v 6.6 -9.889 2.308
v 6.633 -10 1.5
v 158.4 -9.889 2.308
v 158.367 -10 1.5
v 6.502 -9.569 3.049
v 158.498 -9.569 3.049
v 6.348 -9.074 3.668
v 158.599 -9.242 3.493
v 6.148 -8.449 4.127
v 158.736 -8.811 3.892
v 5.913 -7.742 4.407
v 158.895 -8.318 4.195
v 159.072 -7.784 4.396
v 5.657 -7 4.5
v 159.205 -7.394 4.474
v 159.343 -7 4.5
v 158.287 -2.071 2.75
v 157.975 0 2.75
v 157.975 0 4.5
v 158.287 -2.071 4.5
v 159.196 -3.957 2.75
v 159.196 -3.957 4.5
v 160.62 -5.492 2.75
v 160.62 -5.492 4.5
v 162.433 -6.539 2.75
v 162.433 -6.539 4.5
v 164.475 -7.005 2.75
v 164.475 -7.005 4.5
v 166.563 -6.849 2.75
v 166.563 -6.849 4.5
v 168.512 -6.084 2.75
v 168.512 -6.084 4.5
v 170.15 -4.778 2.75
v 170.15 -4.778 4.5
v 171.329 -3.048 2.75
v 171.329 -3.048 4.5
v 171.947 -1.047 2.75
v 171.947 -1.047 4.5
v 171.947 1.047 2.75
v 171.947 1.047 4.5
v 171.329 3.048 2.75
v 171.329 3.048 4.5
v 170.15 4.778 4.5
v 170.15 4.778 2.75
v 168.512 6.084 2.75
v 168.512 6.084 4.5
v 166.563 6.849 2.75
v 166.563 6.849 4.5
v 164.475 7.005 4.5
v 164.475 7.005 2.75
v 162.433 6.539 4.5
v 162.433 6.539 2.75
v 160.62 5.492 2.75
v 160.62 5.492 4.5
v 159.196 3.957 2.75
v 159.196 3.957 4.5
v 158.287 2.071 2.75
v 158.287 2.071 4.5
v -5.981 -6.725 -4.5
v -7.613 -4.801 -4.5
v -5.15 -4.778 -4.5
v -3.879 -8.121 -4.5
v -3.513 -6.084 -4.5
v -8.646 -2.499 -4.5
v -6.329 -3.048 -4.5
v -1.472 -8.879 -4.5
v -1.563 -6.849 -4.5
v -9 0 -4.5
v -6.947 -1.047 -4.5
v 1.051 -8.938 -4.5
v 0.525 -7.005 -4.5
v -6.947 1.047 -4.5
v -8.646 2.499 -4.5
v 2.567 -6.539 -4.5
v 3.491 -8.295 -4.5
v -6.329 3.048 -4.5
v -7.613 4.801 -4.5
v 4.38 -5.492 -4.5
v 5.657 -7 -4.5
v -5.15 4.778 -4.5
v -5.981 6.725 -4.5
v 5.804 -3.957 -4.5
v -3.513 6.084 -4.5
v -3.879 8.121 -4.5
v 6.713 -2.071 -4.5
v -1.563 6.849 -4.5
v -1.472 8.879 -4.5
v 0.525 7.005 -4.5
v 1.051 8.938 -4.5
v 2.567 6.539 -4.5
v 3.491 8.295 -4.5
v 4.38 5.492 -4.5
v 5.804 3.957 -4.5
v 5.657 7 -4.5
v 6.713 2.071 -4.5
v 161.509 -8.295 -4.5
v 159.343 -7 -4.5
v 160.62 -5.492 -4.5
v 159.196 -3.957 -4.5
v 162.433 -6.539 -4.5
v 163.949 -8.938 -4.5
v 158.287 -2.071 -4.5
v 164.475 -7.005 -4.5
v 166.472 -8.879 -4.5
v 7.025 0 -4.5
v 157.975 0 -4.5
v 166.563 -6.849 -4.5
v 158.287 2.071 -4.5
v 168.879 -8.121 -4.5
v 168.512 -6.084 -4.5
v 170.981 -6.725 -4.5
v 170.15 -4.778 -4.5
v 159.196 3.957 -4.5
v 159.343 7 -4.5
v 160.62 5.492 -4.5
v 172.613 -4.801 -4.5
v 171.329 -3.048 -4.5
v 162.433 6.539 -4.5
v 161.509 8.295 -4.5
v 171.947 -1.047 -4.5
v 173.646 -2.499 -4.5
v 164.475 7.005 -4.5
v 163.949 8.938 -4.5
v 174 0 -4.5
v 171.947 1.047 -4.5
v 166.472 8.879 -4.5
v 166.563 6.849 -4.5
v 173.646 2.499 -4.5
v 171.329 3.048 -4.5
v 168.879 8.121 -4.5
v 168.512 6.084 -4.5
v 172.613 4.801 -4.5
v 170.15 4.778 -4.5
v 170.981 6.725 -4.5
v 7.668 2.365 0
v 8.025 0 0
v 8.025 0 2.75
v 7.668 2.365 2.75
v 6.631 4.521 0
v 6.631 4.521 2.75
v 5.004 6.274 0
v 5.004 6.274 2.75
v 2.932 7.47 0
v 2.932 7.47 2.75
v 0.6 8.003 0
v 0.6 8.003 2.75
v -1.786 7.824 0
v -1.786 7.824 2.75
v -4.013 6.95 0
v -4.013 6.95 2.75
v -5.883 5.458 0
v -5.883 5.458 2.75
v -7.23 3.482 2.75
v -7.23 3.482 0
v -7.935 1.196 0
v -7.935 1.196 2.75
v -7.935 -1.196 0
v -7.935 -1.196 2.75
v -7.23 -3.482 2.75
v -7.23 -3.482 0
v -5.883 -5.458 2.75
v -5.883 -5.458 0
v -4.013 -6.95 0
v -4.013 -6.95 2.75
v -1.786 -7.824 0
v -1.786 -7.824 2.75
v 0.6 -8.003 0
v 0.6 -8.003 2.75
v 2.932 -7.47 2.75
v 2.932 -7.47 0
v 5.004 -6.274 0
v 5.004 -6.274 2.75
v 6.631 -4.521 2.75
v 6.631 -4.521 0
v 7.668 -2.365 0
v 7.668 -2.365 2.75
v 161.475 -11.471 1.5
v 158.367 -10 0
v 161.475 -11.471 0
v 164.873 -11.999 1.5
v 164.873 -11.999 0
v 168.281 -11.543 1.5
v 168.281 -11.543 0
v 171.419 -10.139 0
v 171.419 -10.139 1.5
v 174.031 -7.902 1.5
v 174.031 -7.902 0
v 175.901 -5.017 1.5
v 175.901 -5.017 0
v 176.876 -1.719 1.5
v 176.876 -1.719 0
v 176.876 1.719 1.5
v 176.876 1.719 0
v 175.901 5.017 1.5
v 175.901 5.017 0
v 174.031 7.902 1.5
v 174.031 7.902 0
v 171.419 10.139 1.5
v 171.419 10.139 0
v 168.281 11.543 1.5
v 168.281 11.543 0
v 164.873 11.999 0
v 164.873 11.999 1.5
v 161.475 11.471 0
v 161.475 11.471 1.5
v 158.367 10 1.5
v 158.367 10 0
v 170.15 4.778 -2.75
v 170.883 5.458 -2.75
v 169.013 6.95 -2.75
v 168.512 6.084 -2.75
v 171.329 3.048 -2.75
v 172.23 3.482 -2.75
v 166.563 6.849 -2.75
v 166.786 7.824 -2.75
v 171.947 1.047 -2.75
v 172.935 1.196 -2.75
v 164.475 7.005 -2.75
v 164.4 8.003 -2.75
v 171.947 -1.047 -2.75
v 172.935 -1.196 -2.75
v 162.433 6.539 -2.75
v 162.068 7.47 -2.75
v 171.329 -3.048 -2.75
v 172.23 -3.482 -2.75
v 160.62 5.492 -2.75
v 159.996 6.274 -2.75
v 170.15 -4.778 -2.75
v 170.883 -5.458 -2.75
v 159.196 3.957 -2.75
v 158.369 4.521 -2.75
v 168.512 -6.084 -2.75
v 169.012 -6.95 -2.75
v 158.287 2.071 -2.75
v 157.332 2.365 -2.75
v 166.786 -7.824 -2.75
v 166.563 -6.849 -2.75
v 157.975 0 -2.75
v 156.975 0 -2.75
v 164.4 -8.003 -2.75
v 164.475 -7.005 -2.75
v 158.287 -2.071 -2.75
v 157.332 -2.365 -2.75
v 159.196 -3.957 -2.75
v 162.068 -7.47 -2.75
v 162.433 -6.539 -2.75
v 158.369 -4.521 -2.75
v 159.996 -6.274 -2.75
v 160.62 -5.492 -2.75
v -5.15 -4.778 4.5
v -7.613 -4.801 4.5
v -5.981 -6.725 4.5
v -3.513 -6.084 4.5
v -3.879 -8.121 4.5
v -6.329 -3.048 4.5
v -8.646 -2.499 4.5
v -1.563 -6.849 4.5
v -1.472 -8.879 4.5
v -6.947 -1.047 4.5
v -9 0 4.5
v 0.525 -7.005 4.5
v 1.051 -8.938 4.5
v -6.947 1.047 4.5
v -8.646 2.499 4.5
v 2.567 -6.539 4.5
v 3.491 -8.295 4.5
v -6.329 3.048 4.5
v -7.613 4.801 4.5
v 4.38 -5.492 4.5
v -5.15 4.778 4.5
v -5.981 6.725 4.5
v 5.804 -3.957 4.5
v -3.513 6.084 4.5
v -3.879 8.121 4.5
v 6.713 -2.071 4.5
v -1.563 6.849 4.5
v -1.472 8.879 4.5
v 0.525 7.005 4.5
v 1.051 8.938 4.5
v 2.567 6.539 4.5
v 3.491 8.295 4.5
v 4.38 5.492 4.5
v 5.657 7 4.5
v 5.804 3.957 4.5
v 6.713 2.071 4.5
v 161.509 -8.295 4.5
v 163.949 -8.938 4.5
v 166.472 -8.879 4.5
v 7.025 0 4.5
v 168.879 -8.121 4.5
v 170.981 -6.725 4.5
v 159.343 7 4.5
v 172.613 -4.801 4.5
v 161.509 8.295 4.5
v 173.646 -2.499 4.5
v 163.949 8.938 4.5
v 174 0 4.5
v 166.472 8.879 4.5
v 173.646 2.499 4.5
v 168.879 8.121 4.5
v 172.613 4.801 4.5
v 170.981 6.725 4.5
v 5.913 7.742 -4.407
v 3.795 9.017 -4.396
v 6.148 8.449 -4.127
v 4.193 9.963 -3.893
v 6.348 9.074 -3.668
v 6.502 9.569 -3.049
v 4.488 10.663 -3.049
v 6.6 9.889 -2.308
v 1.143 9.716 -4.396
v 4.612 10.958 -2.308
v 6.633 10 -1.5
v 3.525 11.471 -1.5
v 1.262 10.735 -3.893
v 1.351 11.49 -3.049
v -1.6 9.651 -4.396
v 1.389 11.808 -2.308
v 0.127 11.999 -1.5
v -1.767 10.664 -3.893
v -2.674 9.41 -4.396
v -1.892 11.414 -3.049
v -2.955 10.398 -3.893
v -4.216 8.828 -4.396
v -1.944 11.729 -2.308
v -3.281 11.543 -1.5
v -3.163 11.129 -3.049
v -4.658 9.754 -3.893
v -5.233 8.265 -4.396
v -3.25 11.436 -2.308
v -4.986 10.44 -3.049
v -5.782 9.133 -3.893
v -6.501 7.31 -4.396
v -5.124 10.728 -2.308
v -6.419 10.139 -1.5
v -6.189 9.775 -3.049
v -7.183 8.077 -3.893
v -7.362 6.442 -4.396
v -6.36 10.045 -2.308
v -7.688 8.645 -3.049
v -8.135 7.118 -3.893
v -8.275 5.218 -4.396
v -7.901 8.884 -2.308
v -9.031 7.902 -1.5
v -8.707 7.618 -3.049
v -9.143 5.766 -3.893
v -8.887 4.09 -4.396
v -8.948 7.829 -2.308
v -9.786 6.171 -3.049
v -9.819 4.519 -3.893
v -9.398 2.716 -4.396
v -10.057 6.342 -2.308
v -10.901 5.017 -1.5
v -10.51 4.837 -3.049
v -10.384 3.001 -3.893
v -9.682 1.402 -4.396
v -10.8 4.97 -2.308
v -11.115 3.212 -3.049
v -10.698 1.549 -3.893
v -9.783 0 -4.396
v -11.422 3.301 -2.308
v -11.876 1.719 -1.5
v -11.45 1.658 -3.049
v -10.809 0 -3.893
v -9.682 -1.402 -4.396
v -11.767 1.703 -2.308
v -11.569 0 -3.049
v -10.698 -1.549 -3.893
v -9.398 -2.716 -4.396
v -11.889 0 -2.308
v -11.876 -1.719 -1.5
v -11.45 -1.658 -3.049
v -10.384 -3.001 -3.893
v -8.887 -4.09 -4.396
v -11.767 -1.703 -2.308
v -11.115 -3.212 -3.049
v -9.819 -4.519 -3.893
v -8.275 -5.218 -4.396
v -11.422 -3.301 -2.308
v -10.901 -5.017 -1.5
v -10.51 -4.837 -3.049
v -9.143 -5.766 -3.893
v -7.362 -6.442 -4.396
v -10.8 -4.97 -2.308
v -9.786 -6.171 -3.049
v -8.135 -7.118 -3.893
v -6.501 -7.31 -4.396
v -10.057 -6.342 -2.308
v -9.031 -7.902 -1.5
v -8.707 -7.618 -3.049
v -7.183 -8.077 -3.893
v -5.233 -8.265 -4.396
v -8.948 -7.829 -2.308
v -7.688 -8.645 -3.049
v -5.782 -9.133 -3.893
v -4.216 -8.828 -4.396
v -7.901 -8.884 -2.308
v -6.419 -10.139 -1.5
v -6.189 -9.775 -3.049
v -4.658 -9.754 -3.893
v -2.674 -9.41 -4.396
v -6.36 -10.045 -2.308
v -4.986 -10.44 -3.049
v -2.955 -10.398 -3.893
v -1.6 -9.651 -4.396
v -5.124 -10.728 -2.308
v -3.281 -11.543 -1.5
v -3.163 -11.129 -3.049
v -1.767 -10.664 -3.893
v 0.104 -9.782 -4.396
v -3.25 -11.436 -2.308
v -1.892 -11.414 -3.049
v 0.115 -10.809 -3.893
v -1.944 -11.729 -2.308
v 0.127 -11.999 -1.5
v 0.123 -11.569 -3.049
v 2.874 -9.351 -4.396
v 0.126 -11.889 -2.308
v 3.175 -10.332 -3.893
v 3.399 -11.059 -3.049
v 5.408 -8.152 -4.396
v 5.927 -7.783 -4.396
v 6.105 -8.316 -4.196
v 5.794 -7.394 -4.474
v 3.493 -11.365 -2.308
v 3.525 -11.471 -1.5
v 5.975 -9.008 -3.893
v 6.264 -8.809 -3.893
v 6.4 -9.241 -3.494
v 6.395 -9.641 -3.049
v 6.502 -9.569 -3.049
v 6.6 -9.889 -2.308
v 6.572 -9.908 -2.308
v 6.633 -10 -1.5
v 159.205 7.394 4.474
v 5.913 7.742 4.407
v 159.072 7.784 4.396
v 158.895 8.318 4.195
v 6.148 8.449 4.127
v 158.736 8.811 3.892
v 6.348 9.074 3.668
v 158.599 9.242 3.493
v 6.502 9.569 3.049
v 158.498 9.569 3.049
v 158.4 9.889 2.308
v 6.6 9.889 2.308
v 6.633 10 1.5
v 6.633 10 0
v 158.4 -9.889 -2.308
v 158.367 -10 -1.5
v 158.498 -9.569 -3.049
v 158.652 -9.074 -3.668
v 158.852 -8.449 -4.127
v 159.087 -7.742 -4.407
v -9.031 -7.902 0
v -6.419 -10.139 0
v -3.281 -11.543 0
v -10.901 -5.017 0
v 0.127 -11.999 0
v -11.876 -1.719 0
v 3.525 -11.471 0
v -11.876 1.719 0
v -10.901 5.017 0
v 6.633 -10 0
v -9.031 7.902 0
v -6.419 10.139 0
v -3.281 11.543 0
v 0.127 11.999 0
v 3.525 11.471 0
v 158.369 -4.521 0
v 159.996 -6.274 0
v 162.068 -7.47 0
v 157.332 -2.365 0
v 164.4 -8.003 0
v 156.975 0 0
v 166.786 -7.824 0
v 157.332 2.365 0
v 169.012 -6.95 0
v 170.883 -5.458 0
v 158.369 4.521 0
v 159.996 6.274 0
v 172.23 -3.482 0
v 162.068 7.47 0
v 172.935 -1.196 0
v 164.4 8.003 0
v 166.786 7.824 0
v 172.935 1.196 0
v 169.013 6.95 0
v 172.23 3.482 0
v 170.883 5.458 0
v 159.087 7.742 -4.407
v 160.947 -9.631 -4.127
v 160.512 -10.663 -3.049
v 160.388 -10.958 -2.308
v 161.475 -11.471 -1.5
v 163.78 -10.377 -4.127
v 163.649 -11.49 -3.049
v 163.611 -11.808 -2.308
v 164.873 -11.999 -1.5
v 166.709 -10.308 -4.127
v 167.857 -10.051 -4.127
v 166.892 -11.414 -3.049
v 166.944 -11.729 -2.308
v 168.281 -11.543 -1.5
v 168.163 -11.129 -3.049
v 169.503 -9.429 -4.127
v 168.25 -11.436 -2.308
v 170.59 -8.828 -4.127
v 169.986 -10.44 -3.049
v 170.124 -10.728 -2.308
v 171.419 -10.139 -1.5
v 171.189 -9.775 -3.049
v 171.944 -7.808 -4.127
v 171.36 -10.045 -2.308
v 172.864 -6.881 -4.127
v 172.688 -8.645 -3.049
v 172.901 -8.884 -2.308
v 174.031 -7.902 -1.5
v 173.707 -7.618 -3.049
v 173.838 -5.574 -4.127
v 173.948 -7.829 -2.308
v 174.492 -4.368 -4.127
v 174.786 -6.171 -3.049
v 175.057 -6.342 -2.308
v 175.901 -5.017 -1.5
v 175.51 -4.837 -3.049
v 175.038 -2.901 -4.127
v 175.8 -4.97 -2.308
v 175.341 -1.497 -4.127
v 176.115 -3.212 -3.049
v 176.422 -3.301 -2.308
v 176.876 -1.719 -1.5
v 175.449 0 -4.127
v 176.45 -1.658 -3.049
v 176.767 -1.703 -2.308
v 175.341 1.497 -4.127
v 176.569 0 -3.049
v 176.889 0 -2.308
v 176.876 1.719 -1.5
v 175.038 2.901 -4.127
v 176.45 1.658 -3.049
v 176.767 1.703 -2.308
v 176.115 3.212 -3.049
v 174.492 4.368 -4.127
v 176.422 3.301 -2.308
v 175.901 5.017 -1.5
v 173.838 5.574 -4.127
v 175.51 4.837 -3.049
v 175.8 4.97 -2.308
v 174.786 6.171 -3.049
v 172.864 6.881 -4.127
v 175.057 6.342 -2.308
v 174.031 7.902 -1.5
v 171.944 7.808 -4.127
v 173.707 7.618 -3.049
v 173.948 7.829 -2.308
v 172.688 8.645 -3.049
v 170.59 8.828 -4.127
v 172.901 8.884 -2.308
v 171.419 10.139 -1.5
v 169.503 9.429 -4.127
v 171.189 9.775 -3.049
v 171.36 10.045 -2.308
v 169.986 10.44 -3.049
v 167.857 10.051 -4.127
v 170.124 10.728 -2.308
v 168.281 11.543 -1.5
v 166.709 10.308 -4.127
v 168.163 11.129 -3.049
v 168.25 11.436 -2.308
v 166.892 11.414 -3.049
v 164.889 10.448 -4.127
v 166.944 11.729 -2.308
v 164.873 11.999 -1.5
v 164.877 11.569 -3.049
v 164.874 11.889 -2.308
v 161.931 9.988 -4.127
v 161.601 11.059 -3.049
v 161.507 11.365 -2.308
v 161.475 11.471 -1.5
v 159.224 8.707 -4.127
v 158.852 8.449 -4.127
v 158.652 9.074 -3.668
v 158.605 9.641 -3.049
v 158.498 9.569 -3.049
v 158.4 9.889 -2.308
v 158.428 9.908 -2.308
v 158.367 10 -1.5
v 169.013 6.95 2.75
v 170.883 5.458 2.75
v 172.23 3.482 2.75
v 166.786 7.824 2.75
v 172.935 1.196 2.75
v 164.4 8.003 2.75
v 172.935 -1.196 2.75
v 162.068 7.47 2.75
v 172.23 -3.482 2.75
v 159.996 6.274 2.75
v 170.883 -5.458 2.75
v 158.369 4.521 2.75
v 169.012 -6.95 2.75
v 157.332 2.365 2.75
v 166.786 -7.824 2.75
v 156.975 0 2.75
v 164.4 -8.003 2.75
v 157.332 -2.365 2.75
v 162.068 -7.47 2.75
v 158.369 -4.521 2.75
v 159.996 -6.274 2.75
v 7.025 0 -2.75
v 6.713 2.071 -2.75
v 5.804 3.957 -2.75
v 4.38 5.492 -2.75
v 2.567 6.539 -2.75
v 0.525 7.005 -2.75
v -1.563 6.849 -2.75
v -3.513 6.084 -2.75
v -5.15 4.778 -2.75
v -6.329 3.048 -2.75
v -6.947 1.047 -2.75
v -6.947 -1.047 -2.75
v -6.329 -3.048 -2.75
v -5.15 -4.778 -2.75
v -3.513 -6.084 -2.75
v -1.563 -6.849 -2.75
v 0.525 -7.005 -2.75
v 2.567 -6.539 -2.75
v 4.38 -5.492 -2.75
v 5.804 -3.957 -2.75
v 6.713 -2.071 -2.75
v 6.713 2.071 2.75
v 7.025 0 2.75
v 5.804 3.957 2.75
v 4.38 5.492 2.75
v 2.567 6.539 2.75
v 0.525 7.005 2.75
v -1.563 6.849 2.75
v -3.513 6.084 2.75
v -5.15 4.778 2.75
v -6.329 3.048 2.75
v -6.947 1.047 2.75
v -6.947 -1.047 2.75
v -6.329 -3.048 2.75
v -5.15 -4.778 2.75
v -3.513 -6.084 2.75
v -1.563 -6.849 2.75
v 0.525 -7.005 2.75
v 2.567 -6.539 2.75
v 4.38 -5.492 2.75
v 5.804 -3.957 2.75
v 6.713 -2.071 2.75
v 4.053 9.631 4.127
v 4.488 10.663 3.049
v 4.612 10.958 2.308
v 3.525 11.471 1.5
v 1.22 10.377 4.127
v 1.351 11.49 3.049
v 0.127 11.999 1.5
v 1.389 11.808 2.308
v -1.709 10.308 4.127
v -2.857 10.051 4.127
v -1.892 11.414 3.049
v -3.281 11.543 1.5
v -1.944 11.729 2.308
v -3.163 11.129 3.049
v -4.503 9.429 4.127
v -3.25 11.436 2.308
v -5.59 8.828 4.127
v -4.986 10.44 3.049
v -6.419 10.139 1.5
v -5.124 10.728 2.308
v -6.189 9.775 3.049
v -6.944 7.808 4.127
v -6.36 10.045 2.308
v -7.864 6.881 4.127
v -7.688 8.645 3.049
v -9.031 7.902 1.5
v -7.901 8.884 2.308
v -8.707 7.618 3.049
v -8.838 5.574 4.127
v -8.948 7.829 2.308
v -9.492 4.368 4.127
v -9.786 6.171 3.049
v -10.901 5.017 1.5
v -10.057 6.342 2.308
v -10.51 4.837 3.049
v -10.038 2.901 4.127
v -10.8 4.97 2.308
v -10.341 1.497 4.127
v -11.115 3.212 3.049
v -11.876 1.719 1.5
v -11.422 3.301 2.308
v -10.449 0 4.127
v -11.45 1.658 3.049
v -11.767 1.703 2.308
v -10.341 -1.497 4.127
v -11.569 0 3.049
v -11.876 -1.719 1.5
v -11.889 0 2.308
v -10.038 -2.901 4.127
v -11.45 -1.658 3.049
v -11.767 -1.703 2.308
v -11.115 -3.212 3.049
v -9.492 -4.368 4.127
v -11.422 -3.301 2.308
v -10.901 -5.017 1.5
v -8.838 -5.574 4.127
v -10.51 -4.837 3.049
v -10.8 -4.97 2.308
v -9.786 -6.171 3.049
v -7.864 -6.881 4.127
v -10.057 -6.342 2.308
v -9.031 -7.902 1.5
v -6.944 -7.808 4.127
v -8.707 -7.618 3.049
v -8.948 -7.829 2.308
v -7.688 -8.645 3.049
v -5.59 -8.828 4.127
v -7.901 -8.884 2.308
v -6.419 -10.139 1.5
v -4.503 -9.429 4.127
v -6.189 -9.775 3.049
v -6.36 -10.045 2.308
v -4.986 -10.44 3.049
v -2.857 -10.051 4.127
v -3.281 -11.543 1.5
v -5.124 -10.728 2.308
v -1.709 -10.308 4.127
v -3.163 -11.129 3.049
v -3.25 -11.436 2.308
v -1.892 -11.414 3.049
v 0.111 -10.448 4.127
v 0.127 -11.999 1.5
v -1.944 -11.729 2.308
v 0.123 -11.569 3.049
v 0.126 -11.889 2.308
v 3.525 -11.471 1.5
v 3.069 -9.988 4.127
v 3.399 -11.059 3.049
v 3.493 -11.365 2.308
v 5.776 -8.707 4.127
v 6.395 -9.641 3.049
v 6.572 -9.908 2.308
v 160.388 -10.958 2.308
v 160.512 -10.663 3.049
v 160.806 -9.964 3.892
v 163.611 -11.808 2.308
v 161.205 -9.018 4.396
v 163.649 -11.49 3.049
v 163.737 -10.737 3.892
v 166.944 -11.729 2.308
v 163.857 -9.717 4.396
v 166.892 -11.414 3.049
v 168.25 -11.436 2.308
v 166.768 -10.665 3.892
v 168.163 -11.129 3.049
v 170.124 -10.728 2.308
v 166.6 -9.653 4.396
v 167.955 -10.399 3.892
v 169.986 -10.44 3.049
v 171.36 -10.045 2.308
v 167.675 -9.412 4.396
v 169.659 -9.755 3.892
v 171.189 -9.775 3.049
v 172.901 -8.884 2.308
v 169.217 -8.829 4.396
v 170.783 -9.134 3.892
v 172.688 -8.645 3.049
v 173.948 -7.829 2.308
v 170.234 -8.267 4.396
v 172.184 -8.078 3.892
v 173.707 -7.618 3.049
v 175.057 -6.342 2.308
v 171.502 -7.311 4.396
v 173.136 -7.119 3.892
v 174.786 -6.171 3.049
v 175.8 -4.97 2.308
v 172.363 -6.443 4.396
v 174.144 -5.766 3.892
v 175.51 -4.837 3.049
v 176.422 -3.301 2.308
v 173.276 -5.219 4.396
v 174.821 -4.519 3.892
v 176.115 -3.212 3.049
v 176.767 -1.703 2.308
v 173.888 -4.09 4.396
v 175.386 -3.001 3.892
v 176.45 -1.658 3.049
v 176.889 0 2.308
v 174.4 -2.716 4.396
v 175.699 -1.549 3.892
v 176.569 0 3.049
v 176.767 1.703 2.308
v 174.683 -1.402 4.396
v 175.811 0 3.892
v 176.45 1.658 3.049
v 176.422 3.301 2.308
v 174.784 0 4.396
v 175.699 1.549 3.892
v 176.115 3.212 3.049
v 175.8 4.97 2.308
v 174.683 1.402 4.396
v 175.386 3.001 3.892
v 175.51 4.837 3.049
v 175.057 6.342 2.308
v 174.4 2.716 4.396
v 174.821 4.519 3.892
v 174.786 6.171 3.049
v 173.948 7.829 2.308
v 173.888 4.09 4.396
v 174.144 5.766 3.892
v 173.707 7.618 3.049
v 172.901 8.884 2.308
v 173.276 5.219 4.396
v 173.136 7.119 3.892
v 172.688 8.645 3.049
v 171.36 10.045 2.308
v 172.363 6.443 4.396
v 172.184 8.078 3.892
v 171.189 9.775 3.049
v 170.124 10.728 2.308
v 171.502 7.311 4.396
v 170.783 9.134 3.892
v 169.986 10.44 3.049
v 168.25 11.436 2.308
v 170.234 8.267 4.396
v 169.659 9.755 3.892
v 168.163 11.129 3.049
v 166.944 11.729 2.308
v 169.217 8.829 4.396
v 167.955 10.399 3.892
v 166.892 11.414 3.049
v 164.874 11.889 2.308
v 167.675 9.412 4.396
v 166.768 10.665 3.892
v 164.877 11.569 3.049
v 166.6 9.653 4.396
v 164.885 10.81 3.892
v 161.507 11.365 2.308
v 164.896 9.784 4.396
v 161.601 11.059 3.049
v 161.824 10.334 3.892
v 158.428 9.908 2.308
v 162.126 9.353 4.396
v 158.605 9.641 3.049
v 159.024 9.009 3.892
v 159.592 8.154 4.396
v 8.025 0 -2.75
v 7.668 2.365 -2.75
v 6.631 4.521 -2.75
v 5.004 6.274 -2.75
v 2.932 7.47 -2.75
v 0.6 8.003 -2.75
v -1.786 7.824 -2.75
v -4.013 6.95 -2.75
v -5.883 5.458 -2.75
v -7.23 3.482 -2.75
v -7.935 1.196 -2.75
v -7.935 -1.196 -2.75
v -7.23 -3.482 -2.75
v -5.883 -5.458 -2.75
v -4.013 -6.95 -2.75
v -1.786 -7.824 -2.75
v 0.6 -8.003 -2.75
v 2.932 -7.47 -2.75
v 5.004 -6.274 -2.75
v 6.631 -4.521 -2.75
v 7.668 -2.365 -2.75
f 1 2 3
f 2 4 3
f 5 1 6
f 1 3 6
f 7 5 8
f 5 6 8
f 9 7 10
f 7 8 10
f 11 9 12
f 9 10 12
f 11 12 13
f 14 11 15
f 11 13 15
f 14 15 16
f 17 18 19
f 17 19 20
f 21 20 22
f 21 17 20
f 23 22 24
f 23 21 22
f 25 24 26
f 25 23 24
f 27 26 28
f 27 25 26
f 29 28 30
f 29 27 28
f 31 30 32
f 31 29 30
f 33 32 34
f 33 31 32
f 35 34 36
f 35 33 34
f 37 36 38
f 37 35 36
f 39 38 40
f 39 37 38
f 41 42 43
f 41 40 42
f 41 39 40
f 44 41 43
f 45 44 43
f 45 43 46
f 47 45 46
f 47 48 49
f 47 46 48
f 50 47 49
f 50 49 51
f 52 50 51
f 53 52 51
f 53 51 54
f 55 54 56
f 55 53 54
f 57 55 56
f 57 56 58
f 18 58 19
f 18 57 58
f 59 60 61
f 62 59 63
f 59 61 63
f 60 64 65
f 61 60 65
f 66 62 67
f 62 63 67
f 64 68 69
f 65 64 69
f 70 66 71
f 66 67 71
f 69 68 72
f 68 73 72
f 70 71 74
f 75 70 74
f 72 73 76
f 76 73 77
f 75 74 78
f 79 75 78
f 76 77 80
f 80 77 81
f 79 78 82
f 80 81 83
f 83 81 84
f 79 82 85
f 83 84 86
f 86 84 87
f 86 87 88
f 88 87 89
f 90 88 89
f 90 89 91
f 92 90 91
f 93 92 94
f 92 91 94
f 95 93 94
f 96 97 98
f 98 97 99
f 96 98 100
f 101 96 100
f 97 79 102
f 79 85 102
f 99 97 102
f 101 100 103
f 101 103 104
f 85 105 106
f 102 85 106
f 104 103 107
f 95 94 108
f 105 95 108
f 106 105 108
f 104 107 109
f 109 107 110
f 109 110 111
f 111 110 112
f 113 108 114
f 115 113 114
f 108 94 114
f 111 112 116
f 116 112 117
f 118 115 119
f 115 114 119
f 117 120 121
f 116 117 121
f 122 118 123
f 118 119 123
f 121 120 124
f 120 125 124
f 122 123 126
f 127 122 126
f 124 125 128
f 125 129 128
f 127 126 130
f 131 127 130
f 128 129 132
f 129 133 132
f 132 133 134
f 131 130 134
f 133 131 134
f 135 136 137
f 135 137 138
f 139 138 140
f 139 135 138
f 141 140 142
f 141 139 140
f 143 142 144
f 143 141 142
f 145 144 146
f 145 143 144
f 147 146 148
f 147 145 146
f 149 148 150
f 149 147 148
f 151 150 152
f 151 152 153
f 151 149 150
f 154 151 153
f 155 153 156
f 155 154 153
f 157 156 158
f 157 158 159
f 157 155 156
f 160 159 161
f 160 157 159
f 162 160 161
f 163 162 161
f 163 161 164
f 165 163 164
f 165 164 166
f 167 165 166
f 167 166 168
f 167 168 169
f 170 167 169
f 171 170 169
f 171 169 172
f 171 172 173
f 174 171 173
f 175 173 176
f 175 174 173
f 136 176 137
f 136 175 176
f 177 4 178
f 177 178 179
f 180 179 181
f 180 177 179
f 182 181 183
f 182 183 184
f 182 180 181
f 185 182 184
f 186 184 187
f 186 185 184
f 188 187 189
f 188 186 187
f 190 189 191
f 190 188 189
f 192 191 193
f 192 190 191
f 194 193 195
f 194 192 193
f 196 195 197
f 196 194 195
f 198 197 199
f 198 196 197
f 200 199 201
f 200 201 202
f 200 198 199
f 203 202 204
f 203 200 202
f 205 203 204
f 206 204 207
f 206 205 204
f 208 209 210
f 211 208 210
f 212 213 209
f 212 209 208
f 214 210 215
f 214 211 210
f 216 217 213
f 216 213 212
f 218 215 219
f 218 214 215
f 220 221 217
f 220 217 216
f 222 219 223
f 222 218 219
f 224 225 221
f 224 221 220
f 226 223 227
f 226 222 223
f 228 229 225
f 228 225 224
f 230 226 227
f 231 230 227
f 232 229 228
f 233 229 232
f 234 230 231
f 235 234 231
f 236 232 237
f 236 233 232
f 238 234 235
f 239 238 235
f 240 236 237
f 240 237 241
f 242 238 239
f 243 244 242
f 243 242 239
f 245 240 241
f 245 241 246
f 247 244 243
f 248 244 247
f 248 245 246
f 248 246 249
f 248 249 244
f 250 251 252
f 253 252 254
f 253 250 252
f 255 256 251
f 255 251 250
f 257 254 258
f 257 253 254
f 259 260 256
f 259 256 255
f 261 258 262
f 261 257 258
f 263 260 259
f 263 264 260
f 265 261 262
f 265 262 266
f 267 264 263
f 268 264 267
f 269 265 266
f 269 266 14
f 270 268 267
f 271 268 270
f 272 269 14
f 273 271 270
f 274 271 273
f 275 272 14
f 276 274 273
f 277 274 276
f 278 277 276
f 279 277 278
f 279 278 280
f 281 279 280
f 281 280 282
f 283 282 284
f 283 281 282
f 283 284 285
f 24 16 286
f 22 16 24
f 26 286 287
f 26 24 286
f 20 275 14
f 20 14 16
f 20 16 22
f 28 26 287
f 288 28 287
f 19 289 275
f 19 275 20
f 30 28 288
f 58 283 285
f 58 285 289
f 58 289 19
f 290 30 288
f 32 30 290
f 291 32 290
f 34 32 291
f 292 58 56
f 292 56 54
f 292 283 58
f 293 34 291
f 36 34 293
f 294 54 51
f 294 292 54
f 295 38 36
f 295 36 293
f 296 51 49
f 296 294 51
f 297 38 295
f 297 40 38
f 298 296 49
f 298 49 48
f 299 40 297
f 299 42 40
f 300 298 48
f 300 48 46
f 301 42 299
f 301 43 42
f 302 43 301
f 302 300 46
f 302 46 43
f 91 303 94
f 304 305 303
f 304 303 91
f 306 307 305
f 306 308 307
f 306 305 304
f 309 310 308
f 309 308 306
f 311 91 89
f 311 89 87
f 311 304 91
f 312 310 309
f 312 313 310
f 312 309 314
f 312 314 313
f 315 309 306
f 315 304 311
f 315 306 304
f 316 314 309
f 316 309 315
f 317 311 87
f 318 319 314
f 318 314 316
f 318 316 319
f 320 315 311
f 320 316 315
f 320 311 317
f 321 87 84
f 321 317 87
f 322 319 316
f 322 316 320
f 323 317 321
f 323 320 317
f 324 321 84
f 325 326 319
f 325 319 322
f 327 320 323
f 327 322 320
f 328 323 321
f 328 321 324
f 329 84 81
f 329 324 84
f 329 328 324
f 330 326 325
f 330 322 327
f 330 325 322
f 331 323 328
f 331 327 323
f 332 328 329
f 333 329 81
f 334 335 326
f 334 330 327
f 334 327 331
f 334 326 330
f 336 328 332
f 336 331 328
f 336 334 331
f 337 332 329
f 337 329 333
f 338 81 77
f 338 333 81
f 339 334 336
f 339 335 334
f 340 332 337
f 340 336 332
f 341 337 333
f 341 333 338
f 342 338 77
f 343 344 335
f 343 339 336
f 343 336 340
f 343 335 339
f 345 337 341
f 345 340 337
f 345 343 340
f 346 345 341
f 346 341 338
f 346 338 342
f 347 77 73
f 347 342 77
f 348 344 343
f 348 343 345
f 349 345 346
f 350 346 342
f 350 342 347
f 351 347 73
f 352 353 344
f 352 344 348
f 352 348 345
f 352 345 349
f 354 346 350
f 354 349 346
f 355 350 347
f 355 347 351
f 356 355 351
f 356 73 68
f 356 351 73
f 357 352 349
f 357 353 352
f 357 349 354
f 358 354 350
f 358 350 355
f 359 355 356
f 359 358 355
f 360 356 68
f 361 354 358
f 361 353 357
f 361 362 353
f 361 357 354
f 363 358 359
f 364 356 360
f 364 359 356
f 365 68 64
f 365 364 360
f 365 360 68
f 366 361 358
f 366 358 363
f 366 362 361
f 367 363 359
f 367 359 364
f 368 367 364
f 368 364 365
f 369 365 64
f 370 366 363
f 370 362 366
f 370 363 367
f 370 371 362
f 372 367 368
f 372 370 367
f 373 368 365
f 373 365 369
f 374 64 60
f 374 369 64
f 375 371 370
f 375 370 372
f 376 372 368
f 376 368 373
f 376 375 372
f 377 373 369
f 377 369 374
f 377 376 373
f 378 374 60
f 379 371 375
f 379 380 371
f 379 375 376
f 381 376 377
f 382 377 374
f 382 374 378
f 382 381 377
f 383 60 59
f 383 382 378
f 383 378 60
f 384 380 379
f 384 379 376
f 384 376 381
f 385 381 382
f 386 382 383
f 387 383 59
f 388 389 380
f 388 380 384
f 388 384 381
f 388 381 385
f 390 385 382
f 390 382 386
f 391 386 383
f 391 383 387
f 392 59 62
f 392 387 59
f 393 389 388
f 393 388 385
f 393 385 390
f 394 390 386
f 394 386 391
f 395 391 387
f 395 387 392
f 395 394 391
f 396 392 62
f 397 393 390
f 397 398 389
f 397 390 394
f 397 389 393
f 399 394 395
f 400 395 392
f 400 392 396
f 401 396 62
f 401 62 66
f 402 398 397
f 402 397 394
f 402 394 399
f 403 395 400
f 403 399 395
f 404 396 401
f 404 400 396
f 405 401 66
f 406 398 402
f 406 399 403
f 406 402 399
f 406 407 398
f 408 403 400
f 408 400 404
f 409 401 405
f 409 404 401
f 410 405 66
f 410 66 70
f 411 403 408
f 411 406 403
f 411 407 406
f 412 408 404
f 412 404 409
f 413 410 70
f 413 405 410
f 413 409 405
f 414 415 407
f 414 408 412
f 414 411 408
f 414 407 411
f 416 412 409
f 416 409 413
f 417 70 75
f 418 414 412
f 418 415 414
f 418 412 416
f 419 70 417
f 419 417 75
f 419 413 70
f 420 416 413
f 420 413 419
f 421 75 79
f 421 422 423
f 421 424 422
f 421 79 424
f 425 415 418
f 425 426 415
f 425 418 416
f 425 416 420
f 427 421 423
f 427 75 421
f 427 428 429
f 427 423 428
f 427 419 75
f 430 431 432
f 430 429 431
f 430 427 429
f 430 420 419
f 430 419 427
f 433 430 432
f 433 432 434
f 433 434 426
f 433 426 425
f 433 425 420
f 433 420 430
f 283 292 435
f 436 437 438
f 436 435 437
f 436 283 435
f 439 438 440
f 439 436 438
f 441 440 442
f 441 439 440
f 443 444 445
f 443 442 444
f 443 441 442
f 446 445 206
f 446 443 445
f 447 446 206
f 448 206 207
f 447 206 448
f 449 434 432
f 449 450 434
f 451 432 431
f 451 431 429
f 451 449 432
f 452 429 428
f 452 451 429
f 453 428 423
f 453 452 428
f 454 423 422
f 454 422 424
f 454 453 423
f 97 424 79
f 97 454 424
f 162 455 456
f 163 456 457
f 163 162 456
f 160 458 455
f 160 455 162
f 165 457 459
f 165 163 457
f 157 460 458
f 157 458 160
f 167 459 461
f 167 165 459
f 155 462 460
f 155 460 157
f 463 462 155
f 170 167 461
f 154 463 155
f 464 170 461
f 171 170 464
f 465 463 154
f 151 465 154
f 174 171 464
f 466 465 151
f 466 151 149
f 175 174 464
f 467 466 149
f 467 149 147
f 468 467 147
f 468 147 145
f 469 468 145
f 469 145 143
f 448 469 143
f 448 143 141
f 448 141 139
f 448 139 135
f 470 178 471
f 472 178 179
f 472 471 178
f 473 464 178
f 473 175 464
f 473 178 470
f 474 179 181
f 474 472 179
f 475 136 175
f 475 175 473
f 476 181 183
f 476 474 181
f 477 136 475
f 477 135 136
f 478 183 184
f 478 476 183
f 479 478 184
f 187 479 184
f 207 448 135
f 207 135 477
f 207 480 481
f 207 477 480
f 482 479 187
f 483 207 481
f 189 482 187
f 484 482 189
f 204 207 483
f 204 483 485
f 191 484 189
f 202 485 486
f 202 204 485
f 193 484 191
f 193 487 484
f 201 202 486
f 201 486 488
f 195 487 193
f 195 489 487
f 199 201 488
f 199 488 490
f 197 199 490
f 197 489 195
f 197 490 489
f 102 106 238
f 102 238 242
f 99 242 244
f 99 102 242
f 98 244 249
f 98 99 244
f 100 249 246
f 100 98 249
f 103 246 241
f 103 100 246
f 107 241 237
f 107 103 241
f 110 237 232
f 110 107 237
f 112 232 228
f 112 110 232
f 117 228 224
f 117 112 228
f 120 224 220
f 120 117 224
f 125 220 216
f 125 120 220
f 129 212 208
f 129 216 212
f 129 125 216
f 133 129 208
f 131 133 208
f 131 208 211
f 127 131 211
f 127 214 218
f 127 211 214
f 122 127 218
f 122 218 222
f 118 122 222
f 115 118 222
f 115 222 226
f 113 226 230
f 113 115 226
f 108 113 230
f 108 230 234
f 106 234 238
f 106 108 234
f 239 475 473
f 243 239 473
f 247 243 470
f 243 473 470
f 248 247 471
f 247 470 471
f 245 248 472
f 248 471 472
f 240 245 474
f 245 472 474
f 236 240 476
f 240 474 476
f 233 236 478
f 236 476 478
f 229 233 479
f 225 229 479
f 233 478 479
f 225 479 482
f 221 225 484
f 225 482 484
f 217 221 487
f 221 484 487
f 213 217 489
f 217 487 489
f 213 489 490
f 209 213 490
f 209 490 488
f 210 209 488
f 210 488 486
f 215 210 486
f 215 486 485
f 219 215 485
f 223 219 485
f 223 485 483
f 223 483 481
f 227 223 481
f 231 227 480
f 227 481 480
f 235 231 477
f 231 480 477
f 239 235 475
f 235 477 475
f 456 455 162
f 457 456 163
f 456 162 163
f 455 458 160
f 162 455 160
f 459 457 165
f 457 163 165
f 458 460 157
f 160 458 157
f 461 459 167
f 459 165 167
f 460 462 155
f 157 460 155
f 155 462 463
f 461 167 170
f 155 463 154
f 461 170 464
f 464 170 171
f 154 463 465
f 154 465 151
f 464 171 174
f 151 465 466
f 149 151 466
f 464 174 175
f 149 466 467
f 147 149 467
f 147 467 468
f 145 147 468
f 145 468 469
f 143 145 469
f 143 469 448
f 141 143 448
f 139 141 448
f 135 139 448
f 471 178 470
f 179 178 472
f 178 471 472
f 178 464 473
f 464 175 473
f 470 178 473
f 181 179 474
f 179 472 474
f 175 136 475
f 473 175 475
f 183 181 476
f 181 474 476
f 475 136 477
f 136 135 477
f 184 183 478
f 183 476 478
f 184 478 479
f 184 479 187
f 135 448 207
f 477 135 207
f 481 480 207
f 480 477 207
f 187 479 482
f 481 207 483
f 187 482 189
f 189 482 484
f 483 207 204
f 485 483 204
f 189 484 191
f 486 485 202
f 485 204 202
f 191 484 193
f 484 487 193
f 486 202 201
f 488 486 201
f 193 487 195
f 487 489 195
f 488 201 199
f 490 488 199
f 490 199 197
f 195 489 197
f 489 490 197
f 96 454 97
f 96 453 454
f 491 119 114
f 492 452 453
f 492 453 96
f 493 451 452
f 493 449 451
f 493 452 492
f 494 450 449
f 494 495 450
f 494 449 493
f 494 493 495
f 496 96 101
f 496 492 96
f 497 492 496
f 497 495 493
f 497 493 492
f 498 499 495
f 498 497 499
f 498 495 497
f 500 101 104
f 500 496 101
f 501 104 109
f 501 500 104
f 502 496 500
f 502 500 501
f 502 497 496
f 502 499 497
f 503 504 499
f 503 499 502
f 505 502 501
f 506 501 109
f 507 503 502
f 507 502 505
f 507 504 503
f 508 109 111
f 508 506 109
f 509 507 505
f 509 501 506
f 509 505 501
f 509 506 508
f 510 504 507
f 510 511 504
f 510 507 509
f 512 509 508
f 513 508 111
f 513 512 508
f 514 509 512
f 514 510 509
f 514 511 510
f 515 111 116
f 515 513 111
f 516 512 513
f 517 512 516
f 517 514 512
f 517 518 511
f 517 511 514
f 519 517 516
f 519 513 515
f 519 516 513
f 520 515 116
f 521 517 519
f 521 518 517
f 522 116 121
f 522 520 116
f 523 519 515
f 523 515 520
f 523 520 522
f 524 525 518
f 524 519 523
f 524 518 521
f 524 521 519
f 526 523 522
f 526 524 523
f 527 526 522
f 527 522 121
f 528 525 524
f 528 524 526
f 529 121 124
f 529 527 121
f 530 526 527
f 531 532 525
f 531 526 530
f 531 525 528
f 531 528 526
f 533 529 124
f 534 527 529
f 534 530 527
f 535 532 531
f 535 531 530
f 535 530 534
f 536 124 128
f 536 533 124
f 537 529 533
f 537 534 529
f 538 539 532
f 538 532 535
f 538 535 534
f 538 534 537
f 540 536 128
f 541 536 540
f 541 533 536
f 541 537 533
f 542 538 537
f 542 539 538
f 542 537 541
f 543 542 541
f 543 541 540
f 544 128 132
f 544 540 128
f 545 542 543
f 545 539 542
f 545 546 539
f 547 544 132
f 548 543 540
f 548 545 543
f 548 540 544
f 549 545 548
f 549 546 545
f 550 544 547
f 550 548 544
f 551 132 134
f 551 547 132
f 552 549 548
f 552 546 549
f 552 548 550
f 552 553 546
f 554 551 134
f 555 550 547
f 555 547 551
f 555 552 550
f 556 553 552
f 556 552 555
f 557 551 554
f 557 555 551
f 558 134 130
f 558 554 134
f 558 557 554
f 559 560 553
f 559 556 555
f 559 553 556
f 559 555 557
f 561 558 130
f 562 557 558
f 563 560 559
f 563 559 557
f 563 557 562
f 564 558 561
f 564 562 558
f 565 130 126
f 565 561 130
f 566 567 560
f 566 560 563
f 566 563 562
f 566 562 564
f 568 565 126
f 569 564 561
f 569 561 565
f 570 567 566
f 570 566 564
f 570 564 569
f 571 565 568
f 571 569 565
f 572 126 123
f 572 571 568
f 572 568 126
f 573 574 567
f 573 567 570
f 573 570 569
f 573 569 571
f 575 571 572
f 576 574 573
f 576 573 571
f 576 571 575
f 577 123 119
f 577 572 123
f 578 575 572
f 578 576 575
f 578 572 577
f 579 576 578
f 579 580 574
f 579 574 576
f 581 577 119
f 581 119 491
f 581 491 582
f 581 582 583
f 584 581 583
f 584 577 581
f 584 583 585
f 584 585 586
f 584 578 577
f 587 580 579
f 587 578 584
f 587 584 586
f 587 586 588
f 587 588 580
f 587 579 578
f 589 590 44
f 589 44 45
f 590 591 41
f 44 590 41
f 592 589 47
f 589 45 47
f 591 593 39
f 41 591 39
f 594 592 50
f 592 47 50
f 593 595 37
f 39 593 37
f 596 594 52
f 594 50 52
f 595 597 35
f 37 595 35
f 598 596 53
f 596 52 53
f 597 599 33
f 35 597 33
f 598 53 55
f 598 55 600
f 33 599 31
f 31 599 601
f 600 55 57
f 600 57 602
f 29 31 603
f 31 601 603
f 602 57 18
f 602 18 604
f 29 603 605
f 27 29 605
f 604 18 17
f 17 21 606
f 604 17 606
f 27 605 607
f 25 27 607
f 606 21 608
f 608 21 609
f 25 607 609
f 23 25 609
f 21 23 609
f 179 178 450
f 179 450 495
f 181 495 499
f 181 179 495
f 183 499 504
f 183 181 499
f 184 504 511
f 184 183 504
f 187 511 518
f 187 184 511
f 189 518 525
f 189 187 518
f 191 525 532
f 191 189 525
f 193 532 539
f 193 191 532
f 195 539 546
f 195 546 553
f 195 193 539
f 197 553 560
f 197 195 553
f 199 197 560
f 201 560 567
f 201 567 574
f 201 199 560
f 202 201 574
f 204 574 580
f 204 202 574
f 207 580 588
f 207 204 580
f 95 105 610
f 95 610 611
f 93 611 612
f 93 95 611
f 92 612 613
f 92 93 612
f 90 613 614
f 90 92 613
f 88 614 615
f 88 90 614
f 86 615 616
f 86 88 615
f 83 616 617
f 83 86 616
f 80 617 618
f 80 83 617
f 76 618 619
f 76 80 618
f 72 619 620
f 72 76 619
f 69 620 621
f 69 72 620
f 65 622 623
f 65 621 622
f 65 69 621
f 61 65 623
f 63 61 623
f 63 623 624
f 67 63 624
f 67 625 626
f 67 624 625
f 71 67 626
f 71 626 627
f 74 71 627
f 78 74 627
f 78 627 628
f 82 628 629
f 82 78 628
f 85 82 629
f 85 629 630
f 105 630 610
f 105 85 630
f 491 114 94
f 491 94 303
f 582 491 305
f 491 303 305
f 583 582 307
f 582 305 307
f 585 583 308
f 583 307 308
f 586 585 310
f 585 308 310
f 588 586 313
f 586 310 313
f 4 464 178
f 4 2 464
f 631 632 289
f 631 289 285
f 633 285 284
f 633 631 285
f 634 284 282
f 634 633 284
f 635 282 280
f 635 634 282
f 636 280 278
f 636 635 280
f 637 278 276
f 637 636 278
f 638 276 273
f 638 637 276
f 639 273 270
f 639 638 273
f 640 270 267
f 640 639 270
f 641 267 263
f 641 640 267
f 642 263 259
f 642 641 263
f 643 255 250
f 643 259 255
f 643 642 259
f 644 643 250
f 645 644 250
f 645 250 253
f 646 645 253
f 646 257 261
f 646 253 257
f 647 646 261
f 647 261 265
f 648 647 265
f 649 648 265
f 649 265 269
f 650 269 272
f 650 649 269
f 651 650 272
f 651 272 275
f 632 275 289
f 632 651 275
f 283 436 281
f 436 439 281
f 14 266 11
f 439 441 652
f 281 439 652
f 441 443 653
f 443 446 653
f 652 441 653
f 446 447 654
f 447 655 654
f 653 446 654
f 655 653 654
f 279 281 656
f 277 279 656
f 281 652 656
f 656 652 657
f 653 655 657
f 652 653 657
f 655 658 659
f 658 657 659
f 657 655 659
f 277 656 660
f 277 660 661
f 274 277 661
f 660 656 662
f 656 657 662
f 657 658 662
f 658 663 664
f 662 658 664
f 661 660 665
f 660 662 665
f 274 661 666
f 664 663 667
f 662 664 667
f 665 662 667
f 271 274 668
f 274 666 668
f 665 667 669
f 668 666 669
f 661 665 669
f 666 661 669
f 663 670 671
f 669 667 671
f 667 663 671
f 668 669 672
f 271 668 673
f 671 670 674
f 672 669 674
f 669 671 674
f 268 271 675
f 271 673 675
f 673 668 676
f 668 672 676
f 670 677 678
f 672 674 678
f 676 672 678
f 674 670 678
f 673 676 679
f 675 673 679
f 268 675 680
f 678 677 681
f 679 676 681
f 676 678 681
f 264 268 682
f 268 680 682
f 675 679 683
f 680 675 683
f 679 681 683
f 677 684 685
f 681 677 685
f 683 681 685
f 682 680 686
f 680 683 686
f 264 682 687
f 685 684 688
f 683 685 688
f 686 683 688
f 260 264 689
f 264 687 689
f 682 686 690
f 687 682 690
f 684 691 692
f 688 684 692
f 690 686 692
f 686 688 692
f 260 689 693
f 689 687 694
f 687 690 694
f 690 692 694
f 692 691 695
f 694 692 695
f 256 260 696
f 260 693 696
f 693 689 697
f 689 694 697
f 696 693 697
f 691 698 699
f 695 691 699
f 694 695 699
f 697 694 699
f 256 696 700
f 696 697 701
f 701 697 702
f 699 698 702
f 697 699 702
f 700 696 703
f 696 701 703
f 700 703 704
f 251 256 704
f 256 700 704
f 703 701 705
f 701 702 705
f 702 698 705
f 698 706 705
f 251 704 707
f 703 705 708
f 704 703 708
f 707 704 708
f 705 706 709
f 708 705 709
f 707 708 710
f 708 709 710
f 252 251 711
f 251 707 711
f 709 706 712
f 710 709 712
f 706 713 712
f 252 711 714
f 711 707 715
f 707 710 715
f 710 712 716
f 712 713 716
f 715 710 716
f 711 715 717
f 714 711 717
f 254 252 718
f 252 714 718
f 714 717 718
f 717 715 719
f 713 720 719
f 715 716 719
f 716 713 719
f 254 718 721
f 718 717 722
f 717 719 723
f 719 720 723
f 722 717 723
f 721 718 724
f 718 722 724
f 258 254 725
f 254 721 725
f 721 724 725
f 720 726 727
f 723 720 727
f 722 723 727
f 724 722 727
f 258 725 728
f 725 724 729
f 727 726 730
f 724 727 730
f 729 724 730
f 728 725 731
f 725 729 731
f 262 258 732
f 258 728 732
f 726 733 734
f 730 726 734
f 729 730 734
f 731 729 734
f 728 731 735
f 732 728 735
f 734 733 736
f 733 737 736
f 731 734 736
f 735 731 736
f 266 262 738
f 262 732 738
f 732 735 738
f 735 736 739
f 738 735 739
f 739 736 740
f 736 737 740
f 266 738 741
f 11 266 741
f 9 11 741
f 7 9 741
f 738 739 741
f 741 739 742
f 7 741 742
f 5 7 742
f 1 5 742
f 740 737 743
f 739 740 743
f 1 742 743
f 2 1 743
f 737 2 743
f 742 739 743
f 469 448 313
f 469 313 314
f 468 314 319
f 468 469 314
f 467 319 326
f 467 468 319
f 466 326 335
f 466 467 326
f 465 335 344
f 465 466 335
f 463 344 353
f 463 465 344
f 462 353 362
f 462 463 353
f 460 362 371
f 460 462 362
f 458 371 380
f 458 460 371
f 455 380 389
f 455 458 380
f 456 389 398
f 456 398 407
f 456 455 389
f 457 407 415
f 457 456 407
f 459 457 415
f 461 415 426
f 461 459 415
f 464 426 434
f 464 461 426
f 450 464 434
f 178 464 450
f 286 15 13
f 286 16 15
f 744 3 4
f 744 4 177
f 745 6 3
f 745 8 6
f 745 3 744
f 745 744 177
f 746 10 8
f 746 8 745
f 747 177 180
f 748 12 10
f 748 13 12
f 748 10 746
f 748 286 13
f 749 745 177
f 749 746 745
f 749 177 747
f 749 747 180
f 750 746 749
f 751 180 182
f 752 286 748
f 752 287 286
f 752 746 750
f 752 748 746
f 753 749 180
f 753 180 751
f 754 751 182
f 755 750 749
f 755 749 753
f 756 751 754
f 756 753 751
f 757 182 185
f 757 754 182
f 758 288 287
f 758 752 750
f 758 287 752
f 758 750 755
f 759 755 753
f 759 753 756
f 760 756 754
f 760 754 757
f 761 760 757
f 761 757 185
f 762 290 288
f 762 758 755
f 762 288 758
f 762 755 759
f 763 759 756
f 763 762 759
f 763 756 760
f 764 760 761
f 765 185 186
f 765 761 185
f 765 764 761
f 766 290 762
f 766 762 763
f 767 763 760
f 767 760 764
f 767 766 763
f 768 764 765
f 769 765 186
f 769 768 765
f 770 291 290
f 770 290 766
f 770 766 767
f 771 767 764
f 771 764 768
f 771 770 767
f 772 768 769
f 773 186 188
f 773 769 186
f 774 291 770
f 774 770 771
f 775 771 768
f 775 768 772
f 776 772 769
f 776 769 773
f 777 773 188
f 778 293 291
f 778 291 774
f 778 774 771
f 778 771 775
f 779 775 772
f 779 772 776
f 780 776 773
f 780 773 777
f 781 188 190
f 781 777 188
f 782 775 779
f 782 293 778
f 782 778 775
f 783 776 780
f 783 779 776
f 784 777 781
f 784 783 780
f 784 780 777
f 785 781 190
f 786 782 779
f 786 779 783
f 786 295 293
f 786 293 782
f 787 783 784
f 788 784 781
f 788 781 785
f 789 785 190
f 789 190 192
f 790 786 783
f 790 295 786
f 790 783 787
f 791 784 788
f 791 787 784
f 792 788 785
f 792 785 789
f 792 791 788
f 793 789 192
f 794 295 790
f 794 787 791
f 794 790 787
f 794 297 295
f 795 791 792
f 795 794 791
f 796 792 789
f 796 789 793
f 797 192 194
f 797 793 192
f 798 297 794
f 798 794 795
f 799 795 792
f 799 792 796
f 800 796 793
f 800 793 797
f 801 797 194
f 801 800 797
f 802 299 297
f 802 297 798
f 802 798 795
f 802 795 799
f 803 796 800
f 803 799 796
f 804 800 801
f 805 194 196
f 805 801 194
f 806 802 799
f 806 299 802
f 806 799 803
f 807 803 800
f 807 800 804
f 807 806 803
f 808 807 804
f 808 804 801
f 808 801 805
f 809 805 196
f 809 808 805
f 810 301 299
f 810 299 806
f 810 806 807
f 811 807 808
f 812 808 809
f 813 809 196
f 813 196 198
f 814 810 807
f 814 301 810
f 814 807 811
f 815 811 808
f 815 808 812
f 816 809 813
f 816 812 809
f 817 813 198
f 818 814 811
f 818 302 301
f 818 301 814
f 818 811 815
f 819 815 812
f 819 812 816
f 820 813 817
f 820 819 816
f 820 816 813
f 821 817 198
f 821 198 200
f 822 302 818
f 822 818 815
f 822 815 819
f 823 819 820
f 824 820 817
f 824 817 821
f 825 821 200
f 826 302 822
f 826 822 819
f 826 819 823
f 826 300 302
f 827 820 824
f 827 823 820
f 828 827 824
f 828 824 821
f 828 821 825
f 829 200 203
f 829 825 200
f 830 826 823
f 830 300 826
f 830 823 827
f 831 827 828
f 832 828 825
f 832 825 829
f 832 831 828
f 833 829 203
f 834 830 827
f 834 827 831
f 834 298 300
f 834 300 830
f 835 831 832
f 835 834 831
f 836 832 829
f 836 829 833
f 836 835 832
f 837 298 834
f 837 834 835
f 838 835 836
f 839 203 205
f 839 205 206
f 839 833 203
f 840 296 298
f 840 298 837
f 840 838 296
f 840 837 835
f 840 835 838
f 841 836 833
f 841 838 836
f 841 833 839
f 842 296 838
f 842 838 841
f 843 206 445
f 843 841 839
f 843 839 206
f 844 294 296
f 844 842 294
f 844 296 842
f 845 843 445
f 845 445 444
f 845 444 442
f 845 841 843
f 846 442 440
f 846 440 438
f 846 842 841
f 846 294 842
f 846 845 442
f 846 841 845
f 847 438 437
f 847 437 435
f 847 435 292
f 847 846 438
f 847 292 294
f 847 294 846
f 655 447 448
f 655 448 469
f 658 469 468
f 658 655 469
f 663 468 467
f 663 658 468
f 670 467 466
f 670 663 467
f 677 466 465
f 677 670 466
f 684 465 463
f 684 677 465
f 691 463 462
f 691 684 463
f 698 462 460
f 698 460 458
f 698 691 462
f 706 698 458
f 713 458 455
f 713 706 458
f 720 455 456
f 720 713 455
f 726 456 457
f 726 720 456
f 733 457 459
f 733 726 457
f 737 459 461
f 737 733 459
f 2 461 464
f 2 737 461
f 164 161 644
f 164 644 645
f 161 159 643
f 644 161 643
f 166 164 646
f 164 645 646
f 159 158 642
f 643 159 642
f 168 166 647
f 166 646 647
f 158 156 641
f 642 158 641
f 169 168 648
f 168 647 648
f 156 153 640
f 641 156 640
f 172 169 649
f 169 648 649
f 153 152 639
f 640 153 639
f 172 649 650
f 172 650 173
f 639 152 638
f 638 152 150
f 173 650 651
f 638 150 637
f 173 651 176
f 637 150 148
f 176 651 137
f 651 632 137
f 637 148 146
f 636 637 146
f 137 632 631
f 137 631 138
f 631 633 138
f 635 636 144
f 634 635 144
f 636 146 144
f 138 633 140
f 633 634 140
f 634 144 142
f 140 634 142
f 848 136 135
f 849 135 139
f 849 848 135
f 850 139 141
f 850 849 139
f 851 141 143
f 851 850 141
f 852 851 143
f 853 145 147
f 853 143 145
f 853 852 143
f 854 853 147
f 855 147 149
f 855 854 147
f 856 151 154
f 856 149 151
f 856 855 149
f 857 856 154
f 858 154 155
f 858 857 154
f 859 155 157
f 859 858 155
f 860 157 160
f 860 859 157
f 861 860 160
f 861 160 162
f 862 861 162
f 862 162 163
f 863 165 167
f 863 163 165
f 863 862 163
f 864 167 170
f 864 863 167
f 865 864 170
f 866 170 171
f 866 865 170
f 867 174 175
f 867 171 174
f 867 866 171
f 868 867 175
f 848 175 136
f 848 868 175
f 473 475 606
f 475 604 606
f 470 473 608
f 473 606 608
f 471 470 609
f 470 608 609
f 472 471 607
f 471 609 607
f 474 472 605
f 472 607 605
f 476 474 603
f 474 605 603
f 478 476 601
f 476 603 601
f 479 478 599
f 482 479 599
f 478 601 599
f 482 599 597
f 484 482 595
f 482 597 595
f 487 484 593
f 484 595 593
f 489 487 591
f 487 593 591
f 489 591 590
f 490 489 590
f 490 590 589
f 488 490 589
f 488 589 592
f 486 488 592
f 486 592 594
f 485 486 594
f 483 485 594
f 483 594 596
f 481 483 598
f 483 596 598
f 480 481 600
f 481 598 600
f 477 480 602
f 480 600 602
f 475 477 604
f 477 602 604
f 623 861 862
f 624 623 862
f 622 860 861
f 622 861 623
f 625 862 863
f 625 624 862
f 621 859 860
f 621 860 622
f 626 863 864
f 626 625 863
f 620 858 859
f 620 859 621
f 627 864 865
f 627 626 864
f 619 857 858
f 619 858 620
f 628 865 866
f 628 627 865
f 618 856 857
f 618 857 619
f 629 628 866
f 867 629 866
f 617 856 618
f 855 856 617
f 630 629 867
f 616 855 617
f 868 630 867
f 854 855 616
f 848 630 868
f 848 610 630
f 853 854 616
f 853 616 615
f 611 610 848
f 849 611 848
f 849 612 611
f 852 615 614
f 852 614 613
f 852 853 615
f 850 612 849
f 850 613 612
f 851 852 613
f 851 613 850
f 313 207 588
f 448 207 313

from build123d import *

# Parameters (mm, degrees)
BOSS_EXTRUDE1_DEPTH     = 4.5
SKETCH6_23_R            = 8.025
CUT_EXTRUDE1_DEPTH      = 2.75
CUT_EXTRUDE2_DEPTH      = 178.463376503
CUT_EXTRUDE2_DEPTH_BACK = 178.463376503
SKETCH6_24_R            = 7.025
FILLET1_R               = 3


with BuildPart() as part:
    # Sketch6 → Boss-Extrude1 (new, symmetric)
    with BuildSketch(Plane.XY):
        with BuildLine():
            Line((6.633249581, -10), (158.366750419, -10))
            ThreePointArc((158.366750419, -10), (177, 0), (158.366750419, 10))
            Line((158.366750419, 10), (6.633249581, 10))
            ThreePointArc((6.633249581, 10), (-12, 0), (6.633249581, -10))
        make_face()
    extrude(amount=BOSS_EXTRUDE1_DEPTH, both=True)

    # Sketch6<23> → Cut-Extrude1 (cut, symmetric)
    with BuildSketch(Plane.XY):
        Circle(SKETCH6_23_R)
        with Locations((165, 0)):
            Circle(SKETCH6_23_R)
    extrude(amount=CUT_EXTRUDE1_DEPTH, both=True, mode=Mode.SUBTRACT)

    # Sketch6<24> → Cut-Extrude2 (cut, two sides: drawn at the far end of the back side and taken through both)
    with BuildSketch(Plane.XY.offset(-CUT_EXTRUDE2_DEPTH_BACK)):
        Circle(SKETCH6_24_R)
        with Locations((165, 0)):
            Circle(SKETCH6_24_R)
    extrude(amount=CUT_EXTRUDE2_DEPTH + CUT_EXTRUDE2_DEPTH_BACK, mode=Mode.SUBTRACT)

    # Fillet1
    fillet1_edges = [part.edges().sort_by_distance(p)[0] for p in [
        (-12, 0, 4.5),
        (177, 0, 4.5),
        (82.5, -10, 4.5),
        (82.5, 10, 4.5),
        (82.5, -10, -4.5),
        (82.5, 10, -4.5),
        (177, 0, -4.5),
        (-12, 0, -4.5),
    ]]
    fillet(fillet1_edges, radius=FILLET1_R)


with BuildPart() as body_2:
    # Split1: the piece on the far side of the plane
    add(part.part)
    split(bisect_by=Plane.XY, keep=Keep.BOTTOM)


with BuildPart() as part_1:
    add(part.part)

    # Split1
    split(bisect_by=Plane.XY, keep=Keep.TOP)


solid = Compound([body_2.part, part_1.part])
